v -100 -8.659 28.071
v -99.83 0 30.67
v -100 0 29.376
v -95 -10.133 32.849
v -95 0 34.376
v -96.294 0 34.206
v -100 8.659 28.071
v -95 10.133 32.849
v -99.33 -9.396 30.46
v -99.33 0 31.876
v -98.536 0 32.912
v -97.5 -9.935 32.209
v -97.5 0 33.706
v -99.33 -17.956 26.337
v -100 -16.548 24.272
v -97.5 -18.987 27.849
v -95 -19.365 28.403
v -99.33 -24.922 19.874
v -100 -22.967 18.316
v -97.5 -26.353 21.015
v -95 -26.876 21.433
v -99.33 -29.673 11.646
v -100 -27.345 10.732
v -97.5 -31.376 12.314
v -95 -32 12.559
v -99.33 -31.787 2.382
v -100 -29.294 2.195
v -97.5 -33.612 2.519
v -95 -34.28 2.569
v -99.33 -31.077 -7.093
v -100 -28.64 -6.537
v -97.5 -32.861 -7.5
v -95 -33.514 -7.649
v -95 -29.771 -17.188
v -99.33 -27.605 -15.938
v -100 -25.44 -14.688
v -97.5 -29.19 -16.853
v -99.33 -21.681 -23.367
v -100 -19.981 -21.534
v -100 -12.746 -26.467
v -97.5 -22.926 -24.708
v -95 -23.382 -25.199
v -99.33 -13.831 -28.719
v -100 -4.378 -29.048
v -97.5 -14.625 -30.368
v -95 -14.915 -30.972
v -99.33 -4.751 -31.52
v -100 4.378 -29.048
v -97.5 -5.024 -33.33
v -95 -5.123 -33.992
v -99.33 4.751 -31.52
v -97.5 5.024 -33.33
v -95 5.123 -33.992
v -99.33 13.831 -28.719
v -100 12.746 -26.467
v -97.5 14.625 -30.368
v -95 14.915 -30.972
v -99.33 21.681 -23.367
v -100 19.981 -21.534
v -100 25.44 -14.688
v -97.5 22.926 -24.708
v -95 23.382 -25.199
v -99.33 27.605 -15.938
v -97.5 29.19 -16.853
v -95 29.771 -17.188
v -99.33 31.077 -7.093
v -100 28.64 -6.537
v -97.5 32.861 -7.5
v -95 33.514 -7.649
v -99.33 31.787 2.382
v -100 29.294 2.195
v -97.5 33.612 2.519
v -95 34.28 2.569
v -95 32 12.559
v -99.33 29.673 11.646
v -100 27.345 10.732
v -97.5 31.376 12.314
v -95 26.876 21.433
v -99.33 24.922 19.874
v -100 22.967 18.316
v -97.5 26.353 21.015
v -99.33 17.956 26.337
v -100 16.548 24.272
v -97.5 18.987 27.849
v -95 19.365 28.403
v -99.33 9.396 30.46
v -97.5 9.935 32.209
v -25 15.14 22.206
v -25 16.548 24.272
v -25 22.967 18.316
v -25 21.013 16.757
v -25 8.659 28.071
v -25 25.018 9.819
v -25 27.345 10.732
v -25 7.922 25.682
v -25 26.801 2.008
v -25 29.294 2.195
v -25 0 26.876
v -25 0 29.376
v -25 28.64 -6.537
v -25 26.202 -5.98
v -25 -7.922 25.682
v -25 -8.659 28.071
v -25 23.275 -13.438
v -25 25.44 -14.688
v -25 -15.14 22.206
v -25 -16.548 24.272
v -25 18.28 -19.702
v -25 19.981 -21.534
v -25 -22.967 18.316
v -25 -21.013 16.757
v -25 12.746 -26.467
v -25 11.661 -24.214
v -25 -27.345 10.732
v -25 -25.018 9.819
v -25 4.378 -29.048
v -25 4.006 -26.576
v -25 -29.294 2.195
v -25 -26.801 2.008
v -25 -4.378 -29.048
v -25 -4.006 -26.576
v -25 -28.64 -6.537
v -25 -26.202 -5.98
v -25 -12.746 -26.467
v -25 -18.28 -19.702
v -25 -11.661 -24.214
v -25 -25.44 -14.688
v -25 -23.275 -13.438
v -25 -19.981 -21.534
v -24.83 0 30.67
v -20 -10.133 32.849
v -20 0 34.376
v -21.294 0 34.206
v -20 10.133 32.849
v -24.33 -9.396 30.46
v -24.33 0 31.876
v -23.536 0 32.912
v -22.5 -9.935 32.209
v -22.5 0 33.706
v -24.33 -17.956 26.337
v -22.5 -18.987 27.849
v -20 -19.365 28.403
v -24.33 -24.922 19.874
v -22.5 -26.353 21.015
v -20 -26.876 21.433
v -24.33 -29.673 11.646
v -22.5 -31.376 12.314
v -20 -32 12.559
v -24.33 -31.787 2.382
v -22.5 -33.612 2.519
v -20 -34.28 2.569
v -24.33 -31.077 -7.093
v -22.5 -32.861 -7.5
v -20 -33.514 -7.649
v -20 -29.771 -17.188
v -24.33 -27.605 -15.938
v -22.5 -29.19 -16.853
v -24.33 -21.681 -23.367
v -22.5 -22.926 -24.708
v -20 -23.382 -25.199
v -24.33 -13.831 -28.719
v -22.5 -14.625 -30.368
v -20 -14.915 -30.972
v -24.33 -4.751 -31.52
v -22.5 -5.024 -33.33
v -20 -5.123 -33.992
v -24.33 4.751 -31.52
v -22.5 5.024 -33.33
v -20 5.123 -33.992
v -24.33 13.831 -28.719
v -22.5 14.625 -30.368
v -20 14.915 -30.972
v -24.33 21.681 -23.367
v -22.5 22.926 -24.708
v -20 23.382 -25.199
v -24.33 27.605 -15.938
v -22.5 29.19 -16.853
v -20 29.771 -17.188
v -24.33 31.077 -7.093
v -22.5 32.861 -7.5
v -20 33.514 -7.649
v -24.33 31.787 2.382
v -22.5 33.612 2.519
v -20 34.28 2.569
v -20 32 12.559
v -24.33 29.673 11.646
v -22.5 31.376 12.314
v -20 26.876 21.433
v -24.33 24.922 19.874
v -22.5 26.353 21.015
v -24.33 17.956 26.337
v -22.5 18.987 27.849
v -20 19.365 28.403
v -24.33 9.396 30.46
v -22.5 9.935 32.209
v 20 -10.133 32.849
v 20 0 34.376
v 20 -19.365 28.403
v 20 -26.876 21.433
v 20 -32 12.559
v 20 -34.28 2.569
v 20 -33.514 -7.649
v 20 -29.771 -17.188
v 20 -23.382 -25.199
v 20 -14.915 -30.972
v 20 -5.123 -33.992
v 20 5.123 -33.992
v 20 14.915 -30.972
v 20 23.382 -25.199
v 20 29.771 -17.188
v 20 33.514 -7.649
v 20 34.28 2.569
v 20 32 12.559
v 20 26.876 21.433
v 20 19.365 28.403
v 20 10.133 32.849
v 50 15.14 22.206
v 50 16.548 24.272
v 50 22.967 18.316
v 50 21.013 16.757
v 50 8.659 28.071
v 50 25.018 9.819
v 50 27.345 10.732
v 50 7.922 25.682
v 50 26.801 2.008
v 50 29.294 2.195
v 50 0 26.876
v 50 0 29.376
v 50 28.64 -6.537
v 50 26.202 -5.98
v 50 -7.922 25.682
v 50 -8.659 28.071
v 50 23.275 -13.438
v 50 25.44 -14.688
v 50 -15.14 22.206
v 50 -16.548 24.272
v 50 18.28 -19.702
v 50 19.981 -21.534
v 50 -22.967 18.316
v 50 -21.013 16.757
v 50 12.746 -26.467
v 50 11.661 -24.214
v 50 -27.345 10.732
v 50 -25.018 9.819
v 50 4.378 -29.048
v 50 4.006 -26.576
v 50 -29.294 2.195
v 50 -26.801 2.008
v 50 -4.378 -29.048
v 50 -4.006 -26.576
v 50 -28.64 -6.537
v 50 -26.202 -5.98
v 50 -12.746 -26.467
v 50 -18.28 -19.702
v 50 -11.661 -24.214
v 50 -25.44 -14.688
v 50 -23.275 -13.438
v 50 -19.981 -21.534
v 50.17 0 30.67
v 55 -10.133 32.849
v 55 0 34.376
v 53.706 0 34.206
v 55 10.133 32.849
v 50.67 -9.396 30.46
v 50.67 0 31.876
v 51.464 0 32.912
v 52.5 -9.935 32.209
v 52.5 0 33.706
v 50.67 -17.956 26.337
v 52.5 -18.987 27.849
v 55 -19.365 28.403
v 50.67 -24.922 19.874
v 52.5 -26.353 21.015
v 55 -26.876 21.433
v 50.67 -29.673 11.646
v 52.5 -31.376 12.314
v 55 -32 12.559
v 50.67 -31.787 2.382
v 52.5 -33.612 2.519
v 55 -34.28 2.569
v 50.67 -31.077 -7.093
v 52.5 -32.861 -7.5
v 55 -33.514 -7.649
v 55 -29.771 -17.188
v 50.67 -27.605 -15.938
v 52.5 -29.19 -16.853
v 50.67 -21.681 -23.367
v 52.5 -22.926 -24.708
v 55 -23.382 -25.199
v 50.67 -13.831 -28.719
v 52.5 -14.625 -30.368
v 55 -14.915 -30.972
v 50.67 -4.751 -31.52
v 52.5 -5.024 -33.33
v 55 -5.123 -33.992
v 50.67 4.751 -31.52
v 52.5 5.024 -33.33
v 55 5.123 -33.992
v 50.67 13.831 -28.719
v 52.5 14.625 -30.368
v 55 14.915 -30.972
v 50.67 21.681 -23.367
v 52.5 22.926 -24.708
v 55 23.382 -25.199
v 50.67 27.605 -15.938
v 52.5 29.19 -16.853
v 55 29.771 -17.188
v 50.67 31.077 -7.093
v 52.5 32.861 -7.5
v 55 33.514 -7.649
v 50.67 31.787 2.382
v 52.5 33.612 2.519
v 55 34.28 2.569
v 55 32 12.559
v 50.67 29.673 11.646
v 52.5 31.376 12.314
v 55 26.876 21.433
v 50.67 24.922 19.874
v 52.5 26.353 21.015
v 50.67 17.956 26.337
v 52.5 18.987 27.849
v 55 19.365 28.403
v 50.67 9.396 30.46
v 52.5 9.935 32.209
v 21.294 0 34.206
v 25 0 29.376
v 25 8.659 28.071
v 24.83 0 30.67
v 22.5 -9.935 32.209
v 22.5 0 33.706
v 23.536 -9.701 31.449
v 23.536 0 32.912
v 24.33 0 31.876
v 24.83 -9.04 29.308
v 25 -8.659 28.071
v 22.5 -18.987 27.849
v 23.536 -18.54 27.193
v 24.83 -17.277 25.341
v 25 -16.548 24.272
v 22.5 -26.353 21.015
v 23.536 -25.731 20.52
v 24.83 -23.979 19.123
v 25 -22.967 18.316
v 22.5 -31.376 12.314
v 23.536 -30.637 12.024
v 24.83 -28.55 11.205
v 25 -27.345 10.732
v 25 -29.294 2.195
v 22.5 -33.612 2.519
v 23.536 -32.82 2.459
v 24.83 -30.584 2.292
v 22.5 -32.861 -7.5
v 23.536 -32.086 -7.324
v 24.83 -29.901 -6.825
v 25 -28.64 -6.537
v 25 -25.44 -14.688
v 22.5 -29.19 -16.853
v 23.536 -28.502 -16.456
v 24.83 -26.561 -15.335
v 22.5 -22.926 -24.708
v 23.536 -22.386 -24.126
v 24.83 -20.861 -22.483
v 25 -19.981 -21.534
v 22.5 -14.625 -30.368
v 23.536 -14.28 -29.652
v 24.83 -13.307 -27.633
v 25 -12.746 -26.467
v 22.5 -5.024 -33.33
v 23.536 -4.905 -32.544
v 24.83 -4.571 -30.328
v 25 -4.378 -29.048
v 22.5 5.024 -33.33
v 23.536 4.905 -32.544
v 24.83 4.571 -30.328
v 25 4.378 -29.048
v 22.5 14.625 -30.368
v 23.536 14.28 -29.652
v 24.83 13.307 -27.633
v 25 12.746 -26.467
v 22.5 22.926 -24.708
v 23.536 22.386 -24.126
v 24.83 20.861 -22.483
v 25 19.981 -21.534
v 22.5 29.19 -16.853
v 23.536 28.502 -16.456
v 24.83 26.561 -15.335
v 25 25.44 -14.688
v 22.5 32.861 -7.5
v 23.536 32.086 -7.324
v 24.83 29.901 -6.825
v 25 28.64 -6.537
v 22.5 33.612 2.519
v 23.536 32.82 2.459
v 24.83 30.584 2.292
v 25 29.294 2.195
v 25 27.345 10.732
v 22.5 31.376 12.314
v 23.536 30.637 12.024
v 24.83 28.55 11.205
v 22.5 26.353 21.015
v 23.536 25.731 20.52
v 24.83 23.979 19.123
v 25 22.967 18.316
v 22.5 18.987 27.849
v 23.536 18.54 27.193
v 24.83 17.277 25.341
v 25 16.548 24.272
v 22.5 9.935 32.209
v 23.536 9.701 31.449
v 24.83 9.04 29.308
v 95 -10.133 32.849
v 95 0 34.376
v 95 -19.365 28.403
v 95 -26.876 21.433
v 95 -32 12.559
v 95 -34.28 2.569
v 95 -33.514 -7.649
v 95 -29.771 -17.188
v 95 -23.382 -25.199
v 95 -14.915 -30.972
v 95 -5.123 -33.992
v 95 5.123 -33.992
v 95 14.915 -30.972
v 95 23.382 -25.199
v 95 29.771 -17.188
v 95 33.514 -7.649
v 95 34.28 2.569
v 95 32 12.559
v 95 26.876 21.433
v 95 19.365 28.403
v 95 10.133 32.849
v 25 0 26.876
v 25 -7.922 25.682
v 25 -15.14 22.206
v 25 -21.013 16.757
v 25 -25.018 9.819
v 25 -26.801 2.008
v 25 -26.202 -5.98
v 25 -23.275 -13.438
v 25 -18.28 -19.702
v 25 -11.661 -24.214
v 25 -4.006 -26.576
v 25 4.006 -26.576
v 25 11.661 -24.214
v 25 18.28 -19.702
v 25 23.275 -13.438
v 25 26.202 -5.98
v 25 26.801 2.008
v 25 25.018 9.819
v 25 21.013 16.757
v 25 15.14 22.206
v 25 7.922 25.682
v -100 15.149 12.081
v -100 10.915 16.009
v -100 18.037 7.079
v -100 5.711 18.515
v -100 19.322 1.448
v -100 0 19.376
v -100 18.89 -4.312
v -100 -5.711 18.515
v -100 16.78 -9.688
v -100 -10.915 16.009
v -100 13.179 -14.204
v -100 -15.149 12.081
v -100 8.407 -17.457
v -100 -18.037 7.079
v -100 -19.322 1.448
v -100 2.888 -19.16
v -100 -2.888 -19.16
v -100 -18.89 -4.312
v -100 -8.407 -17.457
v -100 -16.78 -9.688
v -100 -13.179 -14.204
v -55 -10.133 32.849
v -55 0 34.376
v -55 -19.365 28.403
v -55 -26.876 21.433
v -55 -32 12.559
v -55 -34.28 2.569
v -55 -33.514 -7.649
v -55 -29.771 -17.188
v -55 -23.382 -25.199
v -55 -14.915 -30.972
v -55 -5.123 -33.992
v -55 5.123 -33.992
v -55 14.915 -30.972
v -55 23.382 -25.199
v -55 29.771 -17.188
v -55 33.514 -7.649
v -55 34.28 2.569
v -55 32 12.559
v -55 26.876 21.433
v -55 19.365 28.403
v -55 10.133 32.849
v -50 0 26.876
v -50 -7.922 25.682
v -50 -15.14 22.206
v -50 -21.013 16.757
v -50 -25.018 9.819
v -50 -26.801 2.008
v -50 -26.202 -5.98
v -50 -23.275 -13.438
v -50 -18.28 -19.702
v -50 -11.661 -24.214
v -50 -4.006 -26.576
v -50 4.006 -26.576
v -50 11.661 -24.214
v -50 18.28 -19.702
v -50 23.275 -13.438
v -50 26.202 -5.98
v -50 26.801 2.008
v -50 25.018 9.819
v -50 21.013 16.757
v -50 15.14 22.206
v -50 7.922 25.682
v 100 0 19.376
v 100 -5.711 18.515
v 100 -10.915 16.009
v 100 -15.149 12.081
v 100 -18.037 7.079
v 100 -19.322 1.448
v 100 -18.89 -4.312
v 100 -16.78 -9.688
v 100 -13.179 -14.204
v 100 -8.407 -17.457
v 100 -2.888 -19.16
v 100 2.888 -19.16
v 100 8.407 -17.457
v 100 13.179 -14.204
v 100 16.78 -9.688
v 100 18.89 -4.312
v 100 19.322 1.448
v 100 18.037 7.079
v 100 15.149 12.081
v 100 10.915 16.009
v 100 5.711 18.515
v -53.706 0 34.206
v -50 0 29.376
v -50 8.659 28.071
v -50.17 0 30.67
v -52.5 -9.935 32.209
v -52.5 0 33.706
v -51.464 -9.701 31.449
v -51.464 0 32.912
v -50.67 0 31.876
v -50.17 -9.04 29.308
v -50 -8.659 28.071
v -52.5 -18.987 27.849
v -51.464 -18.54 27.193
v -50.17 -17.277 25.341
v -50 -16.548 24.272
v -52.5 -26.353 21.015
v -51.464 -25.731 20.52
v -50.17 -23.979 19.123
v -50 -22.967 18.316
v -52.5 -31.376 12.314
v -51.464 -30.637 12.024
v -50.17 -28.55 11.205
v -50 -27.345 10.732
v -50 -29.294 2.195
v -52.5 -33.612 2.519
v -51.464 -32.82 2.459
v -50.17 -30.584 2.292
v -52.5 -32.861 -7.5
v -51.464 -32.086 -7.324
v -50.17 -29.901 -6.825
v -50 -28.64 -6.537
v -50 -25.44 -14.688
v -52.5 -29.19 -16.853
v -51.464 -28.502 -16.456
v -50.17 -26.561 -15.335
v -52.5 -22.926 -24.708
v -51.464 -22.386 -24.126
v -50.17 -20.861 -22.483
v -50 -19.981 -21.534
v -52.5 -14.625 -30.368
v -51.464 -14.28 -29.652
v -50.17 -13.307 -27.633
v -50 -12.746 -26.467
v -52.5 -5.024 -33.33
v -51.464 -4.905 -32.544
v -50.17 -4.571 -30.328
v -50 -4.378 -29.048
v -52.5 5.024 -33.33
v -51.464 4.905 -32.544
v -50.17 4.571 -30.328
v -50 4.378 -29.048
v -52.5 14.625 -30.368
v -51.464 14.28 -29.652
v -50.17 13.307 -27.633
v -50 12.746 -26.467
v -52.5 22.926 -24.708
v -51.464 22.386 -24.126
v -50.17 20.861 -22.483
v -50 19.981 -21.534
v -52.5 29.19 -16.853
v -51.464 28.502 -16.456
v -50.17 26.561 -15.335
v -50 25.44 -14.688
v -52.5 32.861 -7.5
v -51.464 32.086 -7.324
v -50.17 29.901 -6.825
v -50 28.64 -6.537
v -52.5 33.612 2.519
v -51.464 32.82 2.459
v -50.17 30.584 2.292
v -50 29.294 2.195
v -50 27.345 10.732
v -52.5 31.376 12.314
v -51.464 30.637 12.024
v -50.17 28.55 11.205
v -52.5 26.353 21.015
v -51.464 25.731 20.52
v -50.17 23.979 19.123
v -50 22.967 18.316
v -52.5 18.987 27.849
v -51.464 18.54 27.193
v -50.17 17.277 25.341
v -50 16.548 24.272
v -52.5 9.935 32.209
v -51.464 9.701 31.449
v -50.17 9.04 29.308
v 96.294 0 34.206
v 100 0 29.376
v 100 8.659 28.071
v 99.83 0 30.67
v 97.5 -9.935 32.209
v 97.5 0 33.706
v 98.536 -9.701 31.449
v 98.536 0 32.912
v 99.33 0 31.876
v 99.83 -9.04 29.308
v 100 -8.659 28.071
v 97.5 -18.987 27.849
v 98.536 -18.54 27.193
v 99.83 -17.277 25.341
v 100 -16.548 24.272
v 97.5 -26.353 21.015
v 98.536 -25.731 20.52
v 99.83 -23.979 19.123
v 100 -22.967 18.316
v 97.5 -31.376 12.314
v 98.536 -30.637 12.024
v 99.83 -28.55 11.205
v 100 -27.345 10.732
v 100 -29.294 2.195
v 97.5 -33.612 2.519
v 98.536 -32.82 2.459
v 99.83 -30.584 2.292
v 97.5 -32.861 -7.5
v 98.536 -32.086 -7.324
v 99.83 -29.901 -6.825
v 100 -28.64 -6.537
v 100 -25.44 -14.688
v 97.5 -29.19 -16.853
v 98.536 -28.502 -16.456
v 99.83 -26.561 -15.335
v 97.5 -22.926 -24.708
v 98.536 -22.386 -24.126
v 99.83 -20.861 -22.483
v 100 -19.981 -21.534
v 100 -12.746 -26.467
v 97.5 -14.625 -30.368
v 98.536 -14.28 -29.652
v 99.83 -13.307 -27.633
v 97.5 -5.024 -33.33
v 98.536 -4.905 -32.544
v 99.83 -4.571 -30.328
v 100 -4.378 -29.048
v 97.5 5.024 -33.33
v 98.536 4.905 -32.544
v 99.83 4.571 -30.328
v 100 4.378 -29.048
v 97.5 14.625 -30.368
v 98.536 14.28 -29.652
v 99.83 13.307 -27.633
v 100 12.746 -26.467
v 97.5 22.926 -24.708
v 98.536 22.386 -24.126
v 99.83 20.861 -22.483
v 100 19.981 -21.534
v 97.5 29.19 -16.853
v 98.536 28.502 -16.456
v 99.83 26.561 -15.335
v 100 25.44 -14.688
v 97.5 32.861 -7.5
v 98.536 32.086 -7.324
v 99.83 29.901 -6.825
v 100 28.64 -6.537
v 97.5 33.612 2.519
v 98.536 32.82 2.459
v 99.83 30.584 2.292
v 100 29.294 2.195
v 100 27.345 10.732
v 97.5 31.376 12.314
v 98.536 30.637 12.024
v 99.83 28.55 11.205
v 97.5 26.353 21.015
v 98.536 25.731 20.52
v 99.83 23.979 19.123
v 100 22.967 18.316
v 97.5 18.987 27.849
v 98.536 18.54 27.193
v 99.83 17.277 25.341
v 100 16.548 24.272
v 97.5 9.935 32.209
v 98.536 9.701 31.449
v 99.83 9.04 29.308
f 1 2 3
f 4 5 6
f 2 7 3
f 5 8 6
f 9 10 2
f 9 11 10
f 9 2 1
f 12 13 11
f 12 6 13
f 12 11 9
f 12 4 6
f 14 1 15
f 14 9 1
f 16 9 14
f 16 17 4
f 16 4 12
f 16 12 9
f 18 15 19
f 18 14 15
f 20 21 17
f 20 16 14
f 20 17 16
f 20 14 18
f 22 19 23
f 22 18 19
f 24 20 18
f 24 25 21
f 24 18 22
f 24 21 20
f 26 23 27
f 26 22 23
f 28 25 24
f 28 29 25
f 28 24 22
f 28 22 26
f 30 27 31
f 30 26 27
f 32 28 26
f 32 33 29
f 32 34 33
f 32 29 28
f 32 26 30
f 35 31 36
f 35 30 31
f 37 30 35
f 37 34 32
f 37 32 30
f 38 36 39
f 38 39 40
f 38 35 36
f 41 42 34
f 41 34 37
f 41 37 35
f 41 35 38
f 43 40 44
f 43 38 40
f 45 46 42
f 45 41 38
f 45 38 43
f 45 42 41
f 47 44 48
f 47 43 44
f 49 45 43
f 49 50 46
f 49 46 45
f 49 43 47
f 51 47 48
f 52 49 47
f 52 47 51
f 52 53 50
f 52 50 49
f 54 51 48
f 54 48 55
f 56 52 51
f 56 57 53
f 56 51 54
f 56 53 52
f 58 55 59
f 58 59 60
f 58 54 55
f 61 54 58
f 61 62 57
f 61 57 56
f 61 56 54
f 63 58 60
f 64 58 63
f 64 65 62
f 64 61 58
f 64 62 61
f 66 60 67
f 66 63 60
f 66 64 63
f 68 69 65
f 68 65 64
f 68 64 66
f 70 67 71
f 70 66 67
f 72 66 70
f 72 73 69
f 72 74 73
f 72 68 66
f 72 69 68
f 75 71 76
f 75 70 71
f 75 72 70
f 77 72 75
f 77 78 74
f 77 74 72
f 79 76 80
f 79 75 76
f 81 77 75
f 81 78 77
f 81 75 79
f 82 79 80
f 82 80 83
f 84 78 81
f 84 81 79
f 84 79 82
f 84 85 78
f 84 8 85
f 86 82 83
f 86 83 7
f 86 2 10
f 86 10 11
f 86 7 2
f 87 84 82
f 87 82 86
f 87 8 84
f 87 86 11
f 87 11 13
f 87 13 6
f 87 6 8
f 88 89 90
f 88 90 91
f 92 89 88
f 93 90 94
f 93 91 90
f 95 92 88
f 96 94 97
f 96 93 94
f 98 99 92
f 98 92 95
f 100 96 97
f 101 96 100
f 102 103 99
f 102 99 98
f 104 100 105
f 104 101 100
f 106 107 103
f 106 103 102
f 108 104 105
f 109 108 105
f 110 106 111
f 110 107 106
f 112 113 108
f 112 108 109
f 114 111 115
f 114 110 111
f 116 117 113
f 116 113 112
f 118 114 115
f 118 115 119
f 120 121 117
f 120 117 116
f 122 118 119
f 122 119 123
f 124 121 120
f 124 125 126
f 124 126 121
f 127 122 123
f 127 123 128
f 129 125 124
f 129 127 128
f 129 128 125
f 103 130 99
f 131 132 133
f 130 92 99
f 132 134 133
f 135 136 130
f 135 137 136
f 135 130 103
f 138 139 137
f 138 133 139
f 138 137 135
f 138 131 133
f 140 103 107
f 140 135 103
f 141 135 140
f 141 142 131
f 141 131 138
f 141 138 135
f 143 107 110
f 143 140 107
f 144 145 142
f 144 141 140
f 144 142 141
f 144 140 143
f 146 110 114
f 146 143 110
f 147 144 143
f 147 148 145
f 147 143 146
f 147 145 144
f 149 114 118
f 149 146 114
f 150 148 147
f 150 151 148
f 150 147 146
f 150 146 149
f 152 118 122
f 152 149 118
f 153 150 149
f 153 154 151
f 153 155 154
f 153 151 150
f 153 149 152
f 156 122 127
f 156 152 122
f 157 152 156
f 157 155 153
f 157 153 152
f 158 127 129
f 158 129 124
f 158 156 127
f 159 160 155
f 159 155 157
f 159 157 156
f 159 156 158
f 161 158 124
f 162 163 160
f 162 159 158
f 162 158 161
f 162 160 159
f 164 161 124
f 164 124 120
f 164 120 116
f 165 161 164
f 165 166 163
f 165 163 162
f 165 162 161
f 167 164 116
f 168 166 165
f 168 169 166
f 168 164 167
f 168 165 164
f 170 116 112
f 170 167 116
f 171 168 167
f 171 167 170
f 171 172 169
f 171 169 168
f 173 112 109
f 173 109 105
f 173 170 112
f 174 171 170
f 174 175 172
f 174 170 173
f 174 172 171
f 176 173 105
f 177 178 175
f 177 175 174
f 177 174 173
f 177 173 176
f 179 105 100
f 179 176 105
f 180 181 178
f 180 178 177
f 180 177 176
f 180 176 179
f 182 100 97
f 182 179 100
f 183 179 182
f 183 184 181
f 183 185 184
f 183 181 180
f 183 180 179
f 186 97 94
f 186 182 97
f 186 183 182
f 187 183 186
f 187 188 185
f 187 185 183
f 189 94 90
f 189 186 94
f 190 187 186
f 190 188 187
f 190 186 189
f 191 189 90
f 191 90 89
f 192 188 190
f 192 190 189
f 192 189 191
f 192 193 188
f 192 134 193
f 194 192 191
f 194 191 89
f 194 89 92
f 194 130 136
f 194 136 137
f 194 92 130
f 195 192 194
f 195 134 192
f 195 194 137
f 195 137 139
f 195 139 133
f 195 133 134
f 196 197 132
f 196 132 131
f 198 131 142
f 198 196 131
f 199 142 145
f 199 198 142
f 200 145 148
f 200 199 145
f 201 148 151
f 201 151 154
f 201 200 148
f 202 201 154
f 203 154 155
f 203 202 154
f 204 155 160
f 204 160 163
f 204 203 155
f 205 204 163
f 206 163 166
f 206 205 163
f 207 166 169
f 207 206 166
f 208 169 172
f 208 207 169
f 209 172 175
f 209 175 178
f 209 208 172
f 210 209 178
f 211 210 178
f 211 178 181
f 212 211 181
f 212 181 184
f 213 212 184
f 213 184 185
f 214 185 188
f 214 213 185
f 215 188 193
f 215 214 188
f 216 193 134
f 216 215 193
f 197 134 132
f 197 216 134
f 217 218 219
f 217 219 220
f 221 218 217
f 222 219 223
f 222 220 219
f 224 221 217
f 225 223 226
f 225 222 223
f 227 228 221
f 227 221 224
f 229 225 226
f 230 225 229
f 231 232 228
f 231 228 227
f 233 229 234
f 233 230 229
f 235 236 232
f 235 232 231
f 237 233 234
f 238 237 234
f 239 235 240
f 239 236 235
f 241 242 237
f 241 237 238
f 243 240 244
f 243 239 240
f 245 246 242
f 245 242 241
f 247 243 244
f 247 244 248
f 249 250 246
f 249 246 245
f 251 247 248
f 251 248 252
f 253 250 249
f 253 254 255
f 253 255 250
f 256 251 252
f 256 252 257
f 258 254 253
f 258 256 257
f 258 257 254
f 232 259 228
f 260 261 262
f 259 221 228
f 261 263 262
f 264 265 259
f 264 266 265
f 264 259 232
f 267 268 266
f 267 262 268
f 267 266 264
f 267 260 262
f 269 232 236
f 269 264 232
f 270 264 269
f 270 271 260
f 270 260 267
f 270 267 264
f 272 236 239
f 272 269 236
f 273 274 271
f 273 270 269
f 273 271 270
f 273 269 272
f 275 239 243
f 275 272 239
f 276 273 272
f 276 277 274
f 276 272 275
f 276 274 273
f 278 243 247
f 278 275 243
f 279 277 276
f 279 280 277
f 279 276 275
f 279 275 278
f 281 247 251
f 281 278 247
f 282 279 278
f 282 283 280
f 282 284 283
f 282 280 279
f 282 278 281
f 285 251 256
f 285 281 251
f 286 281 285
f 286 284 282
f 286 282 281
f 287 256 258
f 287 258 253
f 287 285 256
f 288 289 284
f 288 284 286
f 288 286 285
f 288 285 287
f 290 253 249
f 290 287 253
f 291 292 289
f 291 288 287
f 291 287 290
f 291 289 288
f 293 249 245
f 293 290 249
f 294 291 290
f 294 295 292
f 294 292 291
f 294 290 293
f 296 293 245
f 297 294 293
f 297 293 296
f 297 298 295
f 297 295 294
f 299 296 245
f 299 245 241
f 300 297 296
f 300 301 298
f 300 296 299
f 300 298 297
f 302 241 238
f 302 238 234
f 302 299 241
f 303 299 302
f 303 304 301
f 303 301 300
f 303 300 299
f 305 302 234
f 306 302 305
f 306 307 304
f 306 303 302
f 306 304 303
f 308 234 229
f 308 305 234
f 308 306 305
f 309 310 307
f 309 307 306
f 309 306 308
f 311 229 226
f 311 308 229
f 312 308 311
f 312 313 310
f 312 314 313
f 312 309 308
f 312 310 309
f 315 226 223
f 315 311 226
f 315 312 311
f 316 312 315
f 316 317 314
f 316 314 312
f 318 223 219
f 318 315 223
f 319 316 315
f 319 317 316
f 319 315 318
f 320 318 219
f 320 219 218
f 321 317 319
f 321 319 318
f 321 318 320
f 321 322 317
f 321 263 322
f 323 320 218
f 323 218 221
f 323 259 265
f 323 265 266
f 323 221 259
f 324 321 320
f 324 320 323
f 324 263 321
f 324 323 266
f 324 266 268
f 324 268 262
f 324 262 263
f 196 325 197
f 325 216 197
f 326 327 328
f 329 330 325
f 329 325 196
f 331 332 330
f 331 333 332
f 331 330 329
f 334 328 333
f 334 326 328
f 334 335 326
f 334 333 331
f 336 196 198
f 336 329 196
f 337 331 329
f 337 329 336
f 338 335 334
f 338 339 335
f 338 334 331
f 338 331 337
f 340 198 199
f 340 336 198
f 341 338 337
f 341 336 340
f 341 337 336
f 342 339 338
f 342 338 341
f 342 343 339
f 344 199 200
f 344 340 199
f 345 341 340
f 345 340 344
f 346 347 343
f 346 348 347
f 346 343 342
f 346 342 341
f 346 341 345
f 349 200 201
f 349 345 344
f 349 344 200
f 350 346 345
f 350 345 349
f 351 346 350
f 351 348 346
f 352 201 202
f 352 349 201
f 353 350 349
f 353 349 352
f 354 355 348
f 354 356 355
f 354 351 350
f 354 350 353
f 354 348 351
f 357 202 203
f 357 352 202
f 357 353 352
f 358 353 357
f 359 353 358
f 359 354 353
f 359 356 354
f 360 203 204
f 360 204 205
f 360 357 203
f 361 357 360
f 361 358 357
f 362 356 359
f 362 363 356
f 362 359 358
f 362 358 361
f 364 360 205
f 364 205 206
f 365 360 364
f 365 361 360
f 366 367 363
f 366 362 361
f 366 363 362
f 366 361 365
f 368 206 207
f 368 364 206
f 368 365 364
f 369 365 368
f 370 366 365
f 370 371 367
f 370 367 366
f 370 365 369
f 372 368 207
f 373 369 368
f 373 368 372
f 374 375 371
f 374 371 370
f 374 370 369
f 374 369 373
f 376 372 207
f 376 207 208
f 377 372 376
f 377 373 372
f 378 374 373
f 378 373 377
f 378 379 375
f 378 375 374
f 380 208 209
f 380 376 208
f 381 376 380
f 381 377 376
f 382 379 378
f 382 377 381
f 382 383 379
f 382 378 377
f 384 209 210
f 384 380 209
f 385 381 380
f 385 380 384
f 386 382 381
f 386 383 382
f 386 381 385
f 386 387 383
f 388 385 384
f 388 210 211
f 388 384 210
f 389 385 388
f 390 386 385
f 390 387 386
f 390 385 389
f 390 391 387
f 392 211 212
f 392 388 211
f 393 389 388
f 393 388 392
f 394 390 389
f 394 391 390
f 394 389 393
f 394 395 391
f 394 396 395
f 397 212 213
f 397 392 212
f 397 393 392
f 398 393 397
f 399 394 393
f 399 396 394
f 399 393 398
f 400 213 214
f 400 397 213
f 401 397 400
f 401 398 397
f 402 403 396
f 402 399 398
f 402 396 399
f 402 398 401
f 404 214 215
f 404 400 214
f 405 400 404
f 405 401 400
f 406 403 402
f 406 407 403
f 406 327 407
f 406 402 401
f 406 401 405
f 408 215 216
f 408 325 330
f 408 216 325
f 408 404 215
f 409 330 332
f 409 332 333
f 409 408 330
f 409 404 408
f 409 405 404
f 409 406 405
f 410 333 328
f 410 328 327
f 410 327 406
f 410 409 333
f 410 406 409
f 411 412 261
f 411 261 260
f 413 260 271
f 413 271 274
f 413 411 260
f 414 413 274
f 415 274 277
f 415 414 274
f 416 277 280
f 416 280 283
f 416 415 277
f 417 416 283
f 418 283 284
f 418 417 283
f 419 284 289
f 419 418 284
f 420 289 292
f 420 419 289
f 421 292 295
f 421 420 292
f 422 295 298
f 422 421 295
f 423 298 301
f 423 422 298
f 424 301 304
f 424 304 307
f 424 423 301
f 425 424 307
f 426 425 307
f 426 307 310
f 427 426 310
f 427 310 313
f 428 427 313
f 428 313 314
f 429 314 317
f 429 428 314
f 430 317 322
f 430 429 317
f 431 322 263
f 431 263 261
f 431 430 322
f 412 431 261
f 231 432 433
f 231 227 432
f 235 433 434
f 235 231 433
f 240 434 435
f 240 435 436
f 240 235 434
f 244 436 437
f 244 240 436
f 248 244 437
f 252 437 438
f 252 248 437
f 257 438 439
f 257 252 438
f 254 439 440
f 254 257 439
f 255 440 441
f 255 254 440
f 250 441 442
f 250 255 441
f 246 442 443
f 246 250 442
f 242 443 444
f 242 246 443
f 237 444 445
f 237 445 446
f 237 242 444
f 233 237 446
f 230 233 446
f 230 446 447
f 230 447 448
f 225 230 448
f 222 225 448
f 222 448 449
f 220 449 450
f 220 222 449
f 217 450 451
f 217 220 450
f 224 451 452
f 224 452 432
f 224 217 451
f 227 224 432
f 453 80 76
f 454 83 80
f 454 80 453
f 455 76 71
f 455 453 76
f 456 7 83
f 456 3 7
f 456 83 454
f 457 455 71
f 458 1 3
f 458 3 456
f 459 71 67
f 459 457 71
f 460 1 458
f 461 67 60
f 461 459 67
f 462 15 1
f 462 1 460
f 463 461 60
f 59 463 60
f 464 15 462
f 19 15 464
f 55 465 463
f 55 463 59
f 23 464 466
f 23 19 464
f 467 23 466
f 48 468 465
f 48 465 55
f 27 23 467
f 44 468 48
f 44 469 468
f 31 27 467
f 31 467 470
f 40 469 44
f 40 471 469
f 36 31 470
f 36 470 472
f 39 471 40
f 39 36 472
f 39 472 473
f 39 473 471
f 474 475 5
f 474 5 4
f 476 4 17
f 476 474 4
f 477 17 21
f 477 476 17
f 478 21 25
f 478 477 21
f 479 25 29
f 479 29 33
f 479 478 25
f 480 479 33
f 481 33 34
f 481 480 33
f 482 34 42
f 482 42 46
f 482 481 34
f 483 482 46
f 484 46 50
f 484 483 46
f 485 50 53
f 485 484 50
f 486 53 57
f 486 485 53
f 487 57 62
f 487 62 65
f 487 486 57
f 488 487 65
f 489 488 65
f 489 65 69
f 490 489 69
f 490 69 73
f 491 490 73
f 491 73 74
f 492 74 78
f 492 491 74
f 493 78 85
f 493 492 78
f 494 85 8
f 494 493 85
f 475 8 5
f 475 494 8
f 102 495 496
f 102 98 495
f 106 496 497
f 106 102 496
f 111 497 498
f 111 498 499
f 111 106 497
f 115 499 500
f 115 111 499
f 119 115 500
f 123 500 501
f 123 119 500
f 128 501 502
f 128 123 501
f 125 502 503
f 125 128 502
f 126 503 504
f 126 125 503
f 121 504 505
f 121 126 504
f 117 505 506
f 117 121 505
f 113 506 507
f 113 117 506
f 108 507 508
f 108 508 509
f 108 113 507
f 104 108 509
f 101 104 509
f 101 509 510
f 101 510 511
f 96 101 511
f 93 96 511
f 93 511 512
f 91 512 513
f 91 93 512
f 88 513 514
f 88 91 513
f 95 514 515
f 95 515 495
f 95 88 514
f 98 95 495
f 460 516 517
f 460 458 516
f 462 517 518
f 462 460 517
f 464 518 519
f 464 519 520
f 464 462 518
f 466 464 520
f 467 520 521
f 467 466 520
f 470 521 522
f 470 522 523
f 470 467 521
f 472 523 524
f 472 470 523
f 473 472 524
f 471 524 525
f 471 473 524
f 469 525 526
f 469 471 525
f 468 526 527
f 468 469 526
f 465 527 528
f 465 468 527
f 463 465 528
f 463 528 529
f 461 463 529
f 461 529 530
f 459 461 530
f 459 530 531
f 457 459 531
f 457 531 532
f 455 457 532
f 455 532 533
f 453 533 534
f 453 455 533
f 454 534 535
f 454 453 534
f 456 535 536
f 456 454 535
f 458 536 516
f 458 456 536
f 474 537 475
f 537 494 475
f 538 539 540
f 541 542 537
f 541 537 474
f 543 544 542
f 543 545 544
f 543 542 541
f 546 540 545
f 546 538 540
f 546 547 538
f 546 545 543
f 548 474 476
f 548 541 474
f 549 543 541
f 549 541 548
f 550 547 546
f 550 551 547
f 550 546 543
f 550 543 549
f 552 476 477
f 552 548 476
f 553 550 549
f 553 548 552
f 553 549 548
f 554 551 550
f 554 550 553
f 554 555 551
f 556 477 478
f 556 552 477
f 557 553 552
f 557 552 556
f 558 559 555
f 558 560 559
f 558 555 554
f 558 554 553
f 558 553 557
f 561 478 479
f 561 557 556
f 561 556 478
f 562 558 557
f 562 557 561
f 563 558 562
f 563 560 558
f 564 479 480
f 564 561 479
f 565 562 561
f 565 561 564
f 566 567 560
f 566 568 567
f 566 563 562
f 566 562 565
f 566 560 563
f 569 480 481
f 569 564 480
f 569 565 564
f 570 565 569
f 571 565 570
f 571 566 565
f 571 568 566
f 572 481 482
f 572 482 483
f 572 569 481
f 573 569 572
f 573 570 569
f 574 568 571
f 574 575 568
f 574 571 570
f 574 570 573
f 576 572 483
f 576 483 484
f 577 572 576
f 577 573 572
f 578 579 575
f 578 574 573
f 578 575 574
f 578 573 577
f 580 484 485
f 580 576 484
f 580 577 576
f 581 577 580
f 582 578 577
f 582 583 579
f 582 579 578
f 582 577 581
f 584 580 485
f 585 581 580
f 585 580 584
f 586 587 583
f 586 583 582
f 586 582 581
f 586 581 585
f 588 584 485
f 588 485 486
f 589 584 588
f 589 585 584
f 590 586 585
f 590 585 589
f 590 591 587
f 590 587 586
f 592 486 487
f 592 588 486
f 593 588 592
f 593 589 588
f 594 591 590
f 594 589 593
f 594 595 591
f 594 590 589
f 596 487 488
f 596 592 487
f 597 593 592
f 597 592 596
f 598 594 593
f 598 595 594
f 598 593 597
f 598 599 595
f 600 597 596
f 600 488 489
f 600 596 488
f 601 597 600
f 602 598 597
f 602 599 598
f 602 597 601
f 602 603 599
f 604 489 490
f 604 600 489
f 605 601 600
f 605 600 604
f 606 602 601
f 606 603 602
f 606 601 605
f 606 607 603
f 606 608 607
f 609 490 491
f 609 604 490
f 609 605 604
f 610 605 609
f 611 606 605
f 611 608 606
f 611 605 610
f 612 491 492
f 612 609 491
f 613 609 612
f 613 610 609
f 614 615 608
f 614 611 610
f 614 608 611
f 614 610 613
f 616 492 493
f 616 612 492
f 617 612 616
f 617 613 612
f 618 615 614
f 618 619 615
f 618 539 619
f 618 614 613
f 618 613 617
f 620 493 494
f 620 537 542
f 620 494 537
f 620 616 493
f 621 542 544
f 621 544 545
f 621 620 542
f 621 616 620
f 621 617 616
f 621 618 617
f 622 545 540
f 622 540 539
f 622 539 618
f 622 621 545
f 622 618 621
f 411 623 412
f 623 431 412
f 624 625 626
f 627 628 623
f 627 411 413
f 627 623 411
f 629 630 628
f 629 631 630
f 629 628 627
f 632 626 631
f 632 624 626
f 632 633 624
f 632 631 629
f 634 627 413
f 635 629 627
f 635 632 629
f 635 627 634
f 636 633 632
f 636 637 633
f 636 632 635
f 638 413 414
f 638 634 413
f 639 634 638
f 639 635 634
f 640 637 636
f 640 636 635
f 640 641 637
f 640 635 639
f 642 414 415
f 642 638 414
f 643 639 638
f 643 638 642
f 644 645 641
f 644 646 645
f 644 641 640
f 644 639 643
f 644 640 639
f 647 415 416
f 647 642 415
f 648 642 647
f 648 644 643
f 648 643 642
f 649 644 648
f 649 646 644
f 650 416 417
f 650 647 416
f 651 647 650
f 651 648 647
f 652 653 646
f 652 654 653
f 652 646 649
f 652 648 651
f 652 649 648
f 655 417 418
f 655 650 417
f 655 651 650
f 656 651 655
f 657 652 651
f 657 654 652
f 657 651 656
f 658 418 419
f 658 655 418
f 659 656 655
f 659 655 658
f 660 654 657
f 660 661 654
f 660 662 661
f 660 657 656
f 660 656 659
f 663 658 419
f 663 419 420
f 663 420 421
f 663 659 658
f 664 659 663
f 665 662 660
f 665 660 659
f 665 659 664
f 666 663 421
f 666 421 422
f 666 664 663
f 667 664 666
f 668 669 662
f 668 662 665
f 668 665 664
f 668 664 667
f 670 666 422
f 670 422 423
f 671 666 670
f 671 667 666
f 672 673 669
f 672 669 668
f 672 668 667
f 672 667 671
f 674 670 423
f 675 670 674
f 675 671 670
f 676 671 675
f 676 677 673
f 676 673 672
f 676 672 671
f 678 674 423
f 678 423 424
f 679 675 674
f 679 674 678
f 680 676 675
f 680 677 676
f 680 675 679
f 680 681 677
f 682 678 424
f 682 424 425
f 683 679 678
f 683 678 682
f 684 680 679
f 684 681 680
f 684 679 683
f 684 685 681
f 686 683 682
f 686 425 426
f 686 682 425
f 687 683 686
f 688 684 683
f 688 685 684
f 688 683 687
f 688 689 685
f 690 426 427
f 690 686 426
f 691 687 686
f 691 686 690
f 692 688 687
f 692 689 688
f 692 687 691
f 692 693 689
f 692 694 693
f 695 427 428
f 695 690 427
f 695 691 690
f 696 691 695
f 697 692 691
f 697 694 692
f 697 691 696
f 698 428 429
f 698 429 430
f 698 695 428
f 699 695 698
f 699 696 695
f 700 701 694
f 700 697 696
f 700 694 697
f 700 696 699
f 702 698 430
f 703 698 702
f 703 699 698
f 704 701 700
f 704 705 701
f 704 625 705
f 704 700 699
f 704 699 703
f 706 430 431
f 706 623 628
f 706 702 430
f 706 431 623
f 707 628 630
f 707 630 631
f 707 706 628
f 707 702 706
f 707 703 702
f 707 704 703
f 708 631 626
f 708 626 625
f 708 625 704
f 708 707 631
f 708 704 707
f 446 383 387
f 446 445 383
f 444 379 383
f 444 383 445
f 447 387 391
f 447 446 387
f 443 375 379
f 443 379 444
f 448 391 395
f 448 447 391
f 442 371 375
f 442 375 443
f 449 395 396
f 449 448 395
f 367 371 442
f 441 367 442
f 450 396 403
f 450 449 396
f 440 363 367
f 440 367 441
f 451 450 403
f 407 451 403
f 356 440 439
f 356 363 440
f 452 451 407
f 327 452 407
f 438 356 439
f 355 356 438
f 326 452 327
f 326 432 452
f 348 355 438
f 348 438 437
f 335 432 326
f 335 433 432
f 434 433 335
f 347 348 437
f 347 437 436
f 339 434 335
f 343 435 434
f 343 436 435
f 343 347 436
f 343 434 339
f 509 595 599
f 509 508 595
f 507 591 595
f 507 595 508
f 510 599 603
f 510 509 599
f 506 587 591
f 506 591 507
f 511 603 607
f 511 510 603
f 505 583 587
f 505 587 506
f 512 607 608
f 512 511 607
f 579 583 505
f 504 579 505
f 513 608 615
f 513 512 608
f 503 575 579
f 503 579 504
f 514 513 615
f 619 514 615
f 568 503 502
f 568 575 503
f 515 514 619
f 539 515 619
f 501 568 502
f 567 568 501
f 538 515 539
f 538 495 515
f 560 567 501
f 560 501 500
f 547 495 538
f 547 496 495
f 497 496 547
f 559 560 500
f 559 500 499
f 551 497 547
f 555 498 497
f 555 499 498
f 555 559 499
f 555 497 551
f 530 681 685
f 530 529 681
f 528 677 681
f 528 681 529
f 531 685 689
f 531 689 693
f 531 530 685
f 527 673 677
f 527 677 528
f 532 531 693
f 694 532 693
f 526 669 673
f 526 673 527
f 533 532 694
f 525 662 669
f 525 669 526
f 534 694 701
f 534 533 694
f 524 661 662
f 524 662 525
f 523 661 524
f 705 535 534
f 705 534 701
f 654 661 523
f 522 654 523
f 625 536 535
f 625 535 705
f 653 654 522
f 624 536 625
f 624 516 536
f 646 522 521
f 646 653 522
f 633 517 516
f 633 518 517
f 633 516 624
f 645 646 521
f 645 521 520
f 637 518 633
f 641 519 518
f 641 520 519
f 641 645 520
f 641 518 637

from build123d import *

# Parameters (mm, degrees)
FILLET1_R = 5


with BuildPart() as part:
    # Sketch1 → Revolve1 (revolve)
    with BuildSketch(Plane(origin=(0, 0, 0), x_dir=(1, 0, 0), z_dir=(0, 1, 0)), mode=Mode.PRIVATE) as revolve1_sk:
        Polygon((100, 19.376063405), (-100, 19.376063405), (-100, 34.376063405), (-50, 34.376063405), (-50, 26.876063405), (-25, 26.876063405), (-25, 34.376063405), (25, 34.376063405), (25, 26.876063405), (50, 26.876063405), (50, 34.376063405), (100, 34.376063405), align=None)
    revolve(revolve1_sk.sketch.rotate(Axis((-168.854447157, 0, 0), (1, 0, 0)), 180), axis=Axis((-168.854447157, 0, 0), (1, 0, 0)))

    # Fillet1
    fillet1_edges = [part.edges().sort_by_distance(p)[0] for p in [
        (-100, 0, -34.376063405),
        (-50, 0, -34.376063405),
        (-25, 0, -34.376063405),
        (25, 0, -34.376063405),
        (50, 0, -34.376063405),
        (100, 0, -34.376063405),
    ]]
    fillet(fillet1_edges, radius=FILLET1_R)


solid = part.part
